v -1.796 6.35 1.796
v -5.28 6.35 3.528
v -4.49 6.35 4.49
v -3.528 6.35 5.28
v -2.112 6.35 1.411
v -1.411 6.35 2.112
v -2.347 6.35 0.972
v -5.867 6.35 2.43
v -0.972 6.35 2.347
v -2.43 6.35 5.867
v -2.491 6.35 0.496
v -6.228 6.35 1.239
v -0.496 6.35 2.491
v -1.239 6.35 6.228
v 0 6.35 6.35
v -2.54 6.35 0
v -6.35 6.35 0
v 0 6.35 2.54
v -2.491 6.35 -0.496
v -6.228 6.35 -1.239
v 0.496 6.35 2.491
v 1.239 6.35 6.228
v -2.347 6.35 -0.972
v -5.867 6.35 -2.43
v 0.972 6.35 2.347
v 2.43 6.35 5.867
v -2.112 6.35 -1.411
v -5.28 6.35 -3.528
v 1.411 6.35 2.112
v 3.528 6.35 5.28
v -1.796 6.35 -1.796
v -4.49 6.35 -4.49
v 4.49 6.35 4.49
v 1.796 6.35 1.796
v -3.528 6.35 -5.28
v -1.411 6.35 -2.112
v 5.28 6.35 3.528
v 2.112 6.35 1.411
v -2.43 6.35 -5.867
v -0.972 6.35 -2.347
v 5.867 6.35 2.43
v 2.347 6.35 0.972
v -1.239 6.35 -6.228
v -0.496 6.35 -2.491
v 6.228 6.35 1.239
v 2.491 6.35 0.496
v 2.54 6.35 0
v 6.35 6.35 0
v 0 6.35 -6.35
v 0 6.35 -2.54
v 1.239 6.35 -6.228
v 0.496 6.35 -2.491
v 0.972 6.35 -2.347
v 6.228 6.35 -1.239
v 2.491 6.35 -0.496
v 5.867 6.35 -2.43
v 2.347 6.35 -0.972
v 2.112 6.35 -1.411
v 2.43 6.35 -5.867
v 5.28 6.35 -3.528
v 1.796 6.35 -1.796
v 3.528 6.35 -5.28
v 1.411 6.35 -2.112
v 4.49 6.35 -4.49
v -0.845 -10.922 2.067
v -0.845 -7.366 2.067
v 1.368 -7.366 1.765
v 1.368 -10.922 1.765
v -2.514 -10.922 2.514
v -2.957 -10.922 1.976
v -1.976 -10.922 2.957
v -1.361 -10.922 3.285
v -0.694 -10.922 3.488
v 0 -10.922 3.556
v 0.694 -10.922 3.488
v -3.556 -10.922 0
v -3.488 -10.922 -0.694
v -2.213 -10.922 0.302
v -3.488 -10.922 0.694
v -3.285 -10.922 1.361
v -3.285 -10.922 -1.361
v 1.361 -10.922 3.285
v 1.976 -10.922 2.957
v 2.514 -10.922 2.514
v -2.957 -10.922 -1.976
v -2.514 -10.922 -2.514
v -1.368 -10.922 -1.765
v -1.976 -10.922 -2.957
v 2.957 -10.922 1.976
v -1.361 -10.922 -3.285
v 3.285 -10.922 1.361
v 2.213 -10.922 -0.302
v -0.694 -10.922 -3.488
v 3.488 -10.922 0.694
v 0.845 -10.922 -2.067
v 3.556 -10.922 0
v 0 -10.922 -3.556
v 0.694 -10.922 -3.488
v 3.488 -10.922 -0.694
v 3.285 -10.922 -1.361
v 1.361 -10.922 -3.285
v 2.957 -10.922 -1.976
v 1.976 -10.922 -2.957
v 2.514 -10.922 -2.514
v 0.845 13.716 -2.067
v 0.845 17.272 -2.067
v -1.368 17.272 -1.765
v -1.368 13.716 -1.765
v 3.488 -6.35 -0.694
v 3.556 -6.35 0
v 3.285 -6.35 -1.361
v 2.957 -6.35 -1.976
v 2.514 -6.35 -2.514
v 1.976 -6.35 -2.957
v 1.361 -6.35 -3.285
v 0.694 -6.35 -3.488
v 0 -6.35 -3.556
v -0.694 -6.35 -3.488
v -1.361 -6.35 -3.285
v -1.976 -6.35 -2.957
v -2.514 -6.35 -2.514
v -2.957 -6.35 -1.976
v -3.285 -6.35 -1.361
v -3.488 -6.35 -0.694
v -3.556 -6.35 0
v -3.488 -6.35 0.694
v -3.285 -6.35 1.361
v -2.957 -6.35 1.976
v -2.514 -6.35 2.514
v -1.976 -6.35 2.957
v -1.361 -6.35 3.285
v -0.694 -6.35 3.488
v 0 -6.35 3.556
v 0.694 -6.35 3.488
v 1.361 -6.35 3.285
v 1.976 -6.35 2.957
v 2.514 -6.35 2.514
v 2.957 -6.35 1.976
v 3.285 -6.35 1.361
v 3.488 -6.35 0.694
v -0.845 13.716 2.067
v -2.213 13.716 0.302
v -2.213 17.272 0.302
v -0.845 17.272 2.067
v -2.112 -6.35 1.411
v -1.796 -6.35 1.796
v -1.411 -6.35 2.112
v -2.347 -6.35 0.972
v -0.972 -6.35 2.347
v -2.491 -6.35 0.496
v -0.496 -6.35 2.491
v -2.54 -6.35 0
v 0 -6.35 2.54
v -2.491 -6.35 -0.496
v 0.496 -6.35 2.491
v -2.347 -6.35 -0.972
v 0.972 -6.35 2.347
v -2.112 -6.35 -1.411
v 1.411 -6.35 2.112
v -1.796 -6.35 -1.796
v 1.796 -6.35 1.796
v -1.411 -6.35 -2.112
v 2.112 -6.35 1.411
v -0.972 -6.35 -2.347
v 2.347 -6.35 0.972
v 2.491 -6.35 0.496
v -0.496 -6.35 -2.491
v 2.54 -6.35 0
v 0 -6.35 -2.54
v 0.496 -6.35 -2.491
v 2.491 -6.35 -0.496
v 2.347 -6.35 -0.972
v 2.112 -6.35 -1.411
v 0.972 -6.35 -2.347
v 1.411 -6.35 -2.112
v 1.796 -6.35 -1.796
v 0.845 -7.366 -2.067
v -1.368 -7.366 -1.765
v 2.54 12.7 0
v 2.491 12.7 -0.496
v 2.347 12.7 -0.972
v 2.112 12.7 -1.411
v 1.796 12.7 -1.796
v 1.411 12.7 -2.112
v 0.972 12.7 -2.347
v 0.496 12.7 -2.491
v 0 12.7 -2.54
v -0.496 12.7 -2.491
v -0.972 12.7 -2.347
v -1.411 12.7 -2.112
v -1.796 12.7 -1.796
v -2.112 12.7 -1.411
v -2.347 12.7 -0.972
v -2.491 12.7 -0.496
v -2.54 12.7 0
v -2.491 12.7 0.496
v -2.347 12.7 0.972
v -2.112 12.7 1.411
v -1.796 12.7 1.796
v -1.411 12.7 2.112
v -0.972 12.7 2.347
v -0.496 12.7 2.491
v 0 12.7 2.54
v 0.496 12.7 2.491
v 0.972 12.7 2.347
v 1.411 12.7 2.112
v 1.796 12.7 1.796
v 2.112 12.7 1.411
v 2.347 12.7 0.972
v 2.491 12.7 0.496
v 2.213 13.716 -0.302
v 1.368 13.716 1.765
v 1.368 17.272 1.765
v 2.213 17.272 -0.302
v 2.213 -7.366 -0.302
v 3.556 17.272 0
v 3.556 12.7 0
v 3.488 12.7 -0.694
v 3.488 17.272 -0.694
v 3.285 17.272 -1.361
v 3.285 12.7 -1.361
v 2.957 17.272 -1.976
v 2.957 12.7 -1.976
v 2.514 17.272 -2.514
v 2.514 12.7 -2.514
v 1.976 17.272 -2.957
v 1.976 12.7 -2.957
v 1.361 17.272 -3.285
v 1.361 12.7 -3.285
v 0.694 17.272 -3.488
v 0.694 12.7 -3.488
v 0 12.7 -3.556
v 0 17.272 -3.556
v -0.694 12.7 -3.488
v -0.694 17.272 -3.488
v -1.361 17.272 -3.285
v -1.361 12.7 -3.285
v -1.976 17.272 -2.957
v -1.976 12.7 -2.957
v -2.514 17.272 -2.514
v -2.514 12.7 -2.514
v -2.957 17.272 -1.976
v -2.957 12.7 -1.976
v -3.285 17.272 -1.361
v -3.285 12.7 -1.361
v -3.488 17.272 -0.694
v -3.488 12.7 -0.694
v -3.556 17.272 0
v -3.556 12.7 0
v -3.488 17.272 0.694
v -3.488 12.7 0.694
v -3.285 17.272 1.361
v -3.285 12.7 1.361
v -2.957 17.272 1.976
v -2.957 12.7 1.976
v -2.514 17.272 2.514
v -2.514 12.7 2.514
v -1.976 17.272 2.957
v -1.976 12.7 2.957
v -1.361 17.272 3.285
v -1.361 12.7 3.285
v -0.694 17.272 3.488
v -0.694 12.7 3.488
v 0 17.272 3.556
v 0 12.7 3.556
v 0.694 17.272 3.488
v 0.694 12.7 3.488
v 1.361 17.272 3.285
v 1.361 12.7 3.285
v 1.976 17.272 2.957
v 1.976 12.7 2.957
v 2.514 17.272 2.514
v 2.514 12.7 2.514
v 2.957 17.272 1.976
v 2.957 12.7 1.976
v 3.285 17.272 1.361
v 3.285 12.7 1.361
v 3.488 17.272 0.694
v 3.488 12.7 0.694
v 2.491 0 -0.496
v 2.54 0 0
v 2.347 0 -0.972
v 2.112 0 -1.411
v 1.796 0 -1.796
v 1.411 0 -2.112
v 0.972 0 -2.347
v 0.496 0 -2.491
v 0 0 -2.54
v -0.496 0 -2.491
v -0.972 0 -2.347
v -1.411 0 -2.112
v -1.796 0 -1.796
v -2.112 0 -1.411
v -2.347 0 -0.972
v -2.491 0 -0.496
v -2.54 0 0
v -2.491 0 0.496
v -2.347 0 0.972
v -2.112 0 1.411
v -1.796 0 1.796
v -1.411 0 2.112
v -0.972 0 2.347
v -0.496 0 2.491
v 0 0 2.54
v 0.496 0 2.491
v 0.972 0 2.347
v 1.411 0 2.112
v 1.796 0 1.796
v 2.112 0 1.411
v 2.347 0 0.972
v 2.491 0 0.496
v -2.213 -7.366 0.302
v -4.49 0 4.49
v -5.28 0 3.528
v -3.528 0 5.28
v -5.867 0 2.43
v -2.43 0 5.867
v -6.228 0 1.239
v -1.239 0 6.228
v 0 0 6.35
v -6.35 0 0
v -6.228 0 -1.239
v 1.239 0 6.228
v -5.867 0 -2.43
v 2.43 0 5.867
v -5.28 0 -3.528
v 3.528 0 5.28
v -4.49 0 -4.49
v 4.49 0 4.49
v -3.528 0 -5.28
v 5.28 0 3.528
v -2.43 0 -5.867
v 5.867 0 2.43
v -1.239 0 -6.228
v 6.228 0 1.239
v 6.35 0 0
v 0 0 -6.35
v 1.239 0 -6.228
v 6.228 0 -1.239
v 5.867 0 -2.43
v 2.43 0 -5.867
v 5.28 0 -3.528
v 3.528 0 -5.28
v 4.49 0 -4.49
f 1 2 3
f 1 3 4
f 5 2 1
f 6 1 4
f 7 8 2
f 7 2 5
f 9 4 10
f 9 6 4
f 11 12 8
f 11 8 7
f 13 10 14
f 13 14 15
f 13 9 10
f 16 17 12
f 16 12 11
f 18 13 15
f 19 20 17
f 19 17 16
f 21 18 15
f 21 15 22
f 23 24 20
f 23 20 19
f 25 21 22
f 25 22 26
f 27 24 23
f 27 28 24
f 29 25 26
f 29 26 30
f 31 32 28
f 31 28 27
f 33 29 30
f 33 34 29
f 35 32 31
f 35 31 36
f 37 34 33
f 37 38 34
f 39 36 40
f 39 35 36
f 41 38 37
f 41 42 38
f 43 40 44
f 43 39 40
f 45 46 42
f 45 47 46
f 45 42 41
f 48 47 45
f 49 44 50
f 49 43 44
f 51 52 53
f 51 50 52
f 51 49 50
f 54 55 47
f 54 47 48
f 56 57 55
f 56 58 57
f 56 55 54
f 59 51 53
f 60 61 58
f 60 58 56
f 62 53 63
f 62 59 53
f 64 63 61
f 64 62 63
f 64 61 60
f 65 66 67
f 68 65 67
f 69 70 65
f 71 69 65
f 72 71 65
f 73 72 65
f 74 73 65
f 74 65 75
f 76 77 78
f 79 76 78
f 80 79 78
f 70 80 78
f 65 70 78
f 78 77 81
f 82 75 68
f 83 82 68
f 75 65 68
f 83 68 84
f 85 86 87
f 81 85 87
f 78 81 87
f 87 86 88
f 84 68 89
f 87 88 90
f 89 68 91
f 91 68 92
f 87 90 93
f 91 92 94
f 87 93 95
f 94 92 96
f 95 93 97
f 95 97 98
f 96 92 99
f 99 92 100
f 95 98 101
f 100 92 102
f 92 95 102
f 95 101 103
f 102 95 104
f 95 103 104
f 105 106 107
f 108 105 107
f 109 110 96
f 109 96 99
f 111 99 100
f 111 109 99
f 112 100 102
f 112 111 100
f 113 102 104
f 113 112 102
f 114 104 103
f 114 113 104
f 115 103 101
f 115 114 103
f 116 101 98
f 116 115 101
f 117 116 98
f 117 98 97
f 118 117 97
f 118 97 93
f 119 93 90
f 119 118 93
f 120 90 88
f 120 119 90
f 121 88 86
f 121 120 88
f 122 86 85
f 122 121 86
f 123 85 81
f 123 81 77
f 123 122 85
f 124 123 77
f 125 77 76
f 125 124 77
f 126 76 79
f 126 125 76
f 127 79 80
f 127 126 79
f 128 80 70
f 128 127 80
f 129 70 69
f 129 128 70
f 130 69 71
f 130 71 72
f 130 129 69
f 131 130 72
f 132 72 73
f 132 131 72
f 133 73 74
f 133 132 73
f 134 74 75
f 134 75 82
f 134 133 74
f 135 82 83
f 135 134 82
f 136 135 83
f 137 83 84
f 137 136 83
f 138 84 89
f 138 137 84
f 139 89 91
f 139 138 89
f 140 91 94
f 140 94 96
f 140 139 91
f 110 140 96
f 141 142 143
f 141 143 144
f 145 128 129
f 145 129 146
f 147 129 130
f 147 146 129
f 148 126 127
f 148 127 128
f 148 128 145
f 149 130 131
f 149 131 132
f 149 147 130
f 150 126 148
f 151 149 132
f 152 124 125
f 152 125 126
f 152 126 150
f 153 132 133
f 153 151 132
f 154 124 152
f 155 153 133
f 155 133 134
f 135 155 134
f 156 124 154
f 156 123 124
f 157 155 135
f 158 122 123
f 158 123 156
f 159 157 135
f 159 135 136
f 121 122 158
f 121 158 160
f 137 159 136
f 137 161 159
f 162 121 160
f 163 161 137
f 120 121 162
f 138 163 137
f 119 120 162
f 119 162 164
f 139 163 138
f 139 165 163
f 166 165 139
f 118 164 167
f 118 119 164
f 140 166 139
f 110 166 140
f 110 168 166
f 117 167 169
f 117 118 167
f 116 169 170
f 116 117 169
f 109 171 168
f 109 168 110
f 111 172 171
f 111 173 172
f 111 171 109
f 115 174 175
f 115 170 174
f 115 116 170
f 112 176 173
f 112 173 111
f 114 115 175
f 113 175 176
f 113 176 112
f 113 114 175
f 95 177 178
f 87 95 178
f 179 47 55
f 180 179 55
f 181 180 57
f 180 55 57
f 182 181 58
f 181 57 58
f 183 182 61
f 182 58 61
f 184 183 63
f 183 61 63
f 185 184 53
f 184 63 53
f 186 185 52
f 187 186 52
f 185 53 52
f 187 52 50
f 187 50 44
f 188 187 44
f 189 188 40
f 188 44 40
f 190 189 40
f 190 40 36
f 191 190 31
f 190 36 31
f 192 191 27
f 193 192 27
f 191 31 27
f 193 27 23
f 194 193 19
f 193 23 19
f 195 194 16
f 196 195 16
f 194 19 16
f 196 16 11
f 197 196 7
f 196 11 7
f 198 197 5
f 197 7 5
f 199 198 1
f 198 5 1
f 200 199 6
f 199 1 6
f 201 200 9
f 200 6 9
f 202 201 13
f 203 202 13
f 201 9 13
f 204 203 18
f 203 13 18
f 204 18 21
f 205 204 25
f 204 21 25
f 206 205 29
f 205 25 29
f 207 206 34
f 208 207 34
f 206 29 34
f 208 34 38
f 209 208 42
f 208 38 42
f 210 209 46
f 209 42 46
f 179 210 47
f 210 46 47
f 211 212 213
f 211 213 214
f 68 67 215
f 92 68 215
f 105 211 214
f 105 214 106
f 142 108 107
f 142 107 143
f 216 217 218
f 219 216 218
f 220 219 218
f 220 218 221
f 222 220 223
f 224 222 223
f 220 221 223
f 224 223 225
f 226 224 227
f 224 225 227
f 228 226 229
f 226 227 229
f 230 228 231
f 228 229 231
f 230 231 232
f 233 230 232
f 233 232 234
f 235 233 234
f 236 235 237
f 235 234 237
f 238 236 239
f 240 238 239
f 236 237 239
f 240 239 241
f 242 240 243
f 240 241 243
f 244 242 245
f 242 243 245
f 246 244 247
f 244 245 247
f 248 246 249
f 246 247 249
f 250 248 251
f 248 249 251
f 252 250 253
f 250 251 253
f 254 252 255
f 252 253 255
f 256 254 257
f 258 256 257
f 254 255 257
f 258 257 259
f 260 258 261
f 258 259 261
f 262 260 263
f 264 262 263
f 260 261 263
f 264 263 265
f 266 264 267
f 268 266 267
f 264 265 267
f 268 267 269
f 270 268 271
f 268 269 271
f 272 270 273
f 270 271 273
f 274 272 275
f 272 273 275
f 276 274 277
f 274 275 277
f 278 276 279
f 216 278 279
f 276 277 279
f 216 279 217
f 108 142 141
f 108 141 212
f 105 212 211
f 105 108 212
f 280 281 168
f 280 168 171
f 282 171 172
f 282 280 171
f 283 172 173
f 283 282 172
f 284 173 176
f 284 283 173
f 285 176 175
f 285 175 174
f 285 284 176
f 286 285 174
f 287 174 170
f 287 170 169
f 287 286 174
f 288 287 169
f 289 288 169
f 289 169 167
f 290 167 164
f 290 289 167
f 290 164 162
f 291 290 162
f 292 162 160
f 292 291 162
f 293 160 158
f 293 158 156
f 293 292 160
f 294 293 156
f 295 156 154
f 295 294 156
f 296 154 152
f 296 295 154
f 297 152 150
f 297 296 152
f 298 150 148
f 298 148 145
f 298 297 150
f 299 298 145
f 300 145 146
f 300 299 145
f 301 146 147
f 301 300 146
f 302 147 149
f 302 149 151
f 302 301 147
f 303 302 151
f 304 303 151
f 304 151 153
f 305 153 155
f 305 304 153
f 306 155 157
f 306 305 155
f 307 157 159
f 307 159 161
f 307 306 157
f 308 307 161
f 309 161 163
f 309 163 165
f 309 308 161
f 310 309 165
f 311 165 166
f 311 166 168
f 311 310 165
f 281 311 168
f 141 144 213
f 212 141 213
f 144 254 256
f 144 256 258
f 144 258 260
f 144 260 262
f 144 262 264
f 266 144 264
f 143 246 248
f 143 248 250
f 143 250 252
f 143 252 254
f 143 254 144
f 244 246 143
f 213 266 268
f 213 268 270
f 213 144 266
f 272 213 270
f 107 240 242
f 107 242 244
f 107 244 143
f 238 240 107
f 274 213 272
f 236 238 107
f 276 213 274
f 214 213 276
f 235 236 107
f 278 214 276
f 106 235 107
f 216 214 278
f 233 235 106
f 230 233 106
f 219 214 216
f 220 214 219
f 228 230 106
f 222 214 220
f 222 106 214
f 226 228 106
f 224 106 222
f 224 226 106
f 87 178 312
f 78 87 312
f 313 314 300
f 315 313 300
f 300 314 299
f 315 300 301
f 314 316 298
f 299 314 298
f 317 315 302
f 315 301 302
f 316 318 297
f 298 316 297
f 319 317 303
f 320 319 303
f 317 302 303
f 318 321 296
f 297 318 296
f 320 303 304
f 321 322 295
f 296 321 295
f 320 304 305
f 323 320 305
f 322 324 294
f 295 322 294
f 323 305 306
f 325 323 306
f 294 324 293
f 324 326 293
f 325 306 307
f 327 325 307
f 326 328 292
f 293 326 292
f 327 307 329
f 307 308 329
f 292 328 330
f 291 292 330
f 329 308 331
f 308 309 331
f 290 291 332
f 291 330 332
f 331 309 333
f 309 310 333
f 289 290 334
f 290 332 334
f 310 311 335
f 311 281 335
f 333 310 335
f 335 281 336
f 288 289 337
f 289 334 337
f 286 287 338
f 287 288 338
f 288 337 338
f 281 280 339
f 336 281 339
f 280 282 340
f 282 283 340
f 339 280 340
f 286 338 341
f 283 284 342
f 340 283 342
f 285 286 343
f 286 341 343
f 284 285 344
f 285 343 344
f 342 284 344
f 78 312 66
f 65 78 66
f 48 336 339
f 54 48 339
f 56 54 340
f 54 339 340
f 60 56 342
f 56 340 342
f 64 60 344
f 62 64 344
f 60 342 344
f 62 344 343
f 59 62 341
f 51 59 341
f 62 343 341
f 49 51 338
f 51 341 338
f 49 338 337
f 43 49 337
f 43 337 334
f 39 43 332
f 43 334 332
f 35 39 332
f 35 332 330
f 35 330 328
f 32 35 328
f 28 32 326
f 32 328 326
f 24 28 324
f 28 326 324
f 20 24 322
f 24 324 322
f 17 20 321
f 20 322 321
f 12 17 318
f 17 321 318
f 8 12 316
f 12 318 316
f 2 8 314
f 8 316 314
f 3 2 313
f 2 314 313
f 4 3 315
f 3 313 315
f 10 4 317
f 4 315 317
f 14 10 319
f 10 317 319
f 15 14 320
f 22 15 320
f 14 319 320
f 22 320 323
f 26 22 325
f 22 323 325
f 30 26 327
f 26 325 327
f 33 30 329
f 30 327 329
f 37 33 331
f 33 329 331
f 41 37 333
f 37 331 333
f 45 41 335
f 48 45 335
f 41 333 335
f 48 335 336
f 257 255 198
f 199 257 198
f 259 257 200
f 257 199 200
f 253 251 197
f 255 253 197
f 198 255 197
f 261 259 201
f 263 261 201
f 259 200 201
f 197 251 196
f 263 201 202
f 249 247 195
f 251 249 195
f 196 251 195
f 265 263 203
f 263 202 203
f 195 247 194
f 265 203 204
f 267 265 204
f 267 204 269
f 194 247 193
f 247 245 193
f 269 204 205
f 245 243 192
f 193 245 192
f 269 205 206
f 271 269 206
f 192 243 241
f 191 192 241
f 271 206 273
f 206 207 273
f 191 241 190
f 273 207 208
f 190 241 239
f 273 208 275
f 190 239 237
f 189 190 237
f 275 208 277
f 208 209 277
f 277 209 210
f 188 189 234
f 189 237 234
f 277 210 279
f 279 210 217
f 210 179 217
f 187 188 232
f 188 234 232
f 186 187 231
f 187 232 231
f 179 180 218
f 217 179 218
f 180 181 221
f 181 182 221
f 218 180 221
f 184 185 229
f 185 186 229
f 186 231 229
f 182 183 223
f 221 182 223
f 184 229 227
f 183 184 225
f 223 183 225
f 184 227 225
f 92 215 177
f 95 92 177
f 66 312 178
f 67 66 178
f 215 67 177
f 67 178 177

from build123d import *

# Parameters (mm, degrees)
SKETCH1_R           = 6.35
BOSS_EXTRUDE1_DEPTH = 6.35
SKETCH2_R           = 2.54
BOSS_EXTRUDE2_DEPTH = 6.35
SKETCH3_R           = 3.556
BOSS_EXTRUDE3_DEPTH = 4.572
CUT_EXTRUDE1_DEPTH  = 3.556


with BuildPart() as part:
    # Sketch1 → Boss-Extrude1 (new body)
    with BuildSketch(Plane(origin=(0, 0, 0), x_dir=(1, 0, 0), z_dir=(0, 1, 0))):
        Circle(SKETCH1_R)
    extrude(amount=BOSS_EXTRUDE1_DEPTH)

    # Sketch2 → Boss-Extrude2 (add)
    with BuildSketch(Plane(origin=(0, 6.35, 0), x_dir=(1, 0, 0), z_dir=(0, 1, 0))):
        Circle(SKETCH2_R)
    boss_extrude2 = extrude(amount=BOSS_EXTRUDE2_DEPTH)

    # Sketch3 → Boss-Extrude3 (add)
    with BuildSketch(Plane(origin=(0, 12.7, 0), x_dir=(1, 0, 0), z_dir=(0, 1, 0))):
        Circle(SKETCH3_R)
    boss_extrude3 = extrude(amount=BOSS_EXTRUDE3_DEPTH)

    # Sketch4 → Cut-Extrude1 (cut)
    with BuildSketch(Plane(origin=(0, 17.272, 0), x_dir=(1, 0, 0), z_dir=(0, 1, 0))):
        Polygon((2.212562326, 0.301992807), (0.84474772, 2.067131585), (-1.367814605, 1.765138778), (-2.212562326, -0.301992807), (-0.84474772, -2.067131585), (1.367814605, -1.765138778), align=None)
    cut_extrude1 = extrude(amount=-CUT_EXTRUDE1_DEPTH, mode=Mode.SUBTRACT)

    # Mirror1: Boss-Extrude2, Boss-Extrude3, Cut-Extrude1 across plane
    add(boss_extrude2.mirror(Plane.ZX.offset(3.175)))
    add(boss_extrude3.mirror(Plane.ZX.offset(3.175)))
    add(cut_extrude1.mirror(Plane.ZX.offset(3.175)), mode=Mode.SUBTRACT)


solid = part.part
